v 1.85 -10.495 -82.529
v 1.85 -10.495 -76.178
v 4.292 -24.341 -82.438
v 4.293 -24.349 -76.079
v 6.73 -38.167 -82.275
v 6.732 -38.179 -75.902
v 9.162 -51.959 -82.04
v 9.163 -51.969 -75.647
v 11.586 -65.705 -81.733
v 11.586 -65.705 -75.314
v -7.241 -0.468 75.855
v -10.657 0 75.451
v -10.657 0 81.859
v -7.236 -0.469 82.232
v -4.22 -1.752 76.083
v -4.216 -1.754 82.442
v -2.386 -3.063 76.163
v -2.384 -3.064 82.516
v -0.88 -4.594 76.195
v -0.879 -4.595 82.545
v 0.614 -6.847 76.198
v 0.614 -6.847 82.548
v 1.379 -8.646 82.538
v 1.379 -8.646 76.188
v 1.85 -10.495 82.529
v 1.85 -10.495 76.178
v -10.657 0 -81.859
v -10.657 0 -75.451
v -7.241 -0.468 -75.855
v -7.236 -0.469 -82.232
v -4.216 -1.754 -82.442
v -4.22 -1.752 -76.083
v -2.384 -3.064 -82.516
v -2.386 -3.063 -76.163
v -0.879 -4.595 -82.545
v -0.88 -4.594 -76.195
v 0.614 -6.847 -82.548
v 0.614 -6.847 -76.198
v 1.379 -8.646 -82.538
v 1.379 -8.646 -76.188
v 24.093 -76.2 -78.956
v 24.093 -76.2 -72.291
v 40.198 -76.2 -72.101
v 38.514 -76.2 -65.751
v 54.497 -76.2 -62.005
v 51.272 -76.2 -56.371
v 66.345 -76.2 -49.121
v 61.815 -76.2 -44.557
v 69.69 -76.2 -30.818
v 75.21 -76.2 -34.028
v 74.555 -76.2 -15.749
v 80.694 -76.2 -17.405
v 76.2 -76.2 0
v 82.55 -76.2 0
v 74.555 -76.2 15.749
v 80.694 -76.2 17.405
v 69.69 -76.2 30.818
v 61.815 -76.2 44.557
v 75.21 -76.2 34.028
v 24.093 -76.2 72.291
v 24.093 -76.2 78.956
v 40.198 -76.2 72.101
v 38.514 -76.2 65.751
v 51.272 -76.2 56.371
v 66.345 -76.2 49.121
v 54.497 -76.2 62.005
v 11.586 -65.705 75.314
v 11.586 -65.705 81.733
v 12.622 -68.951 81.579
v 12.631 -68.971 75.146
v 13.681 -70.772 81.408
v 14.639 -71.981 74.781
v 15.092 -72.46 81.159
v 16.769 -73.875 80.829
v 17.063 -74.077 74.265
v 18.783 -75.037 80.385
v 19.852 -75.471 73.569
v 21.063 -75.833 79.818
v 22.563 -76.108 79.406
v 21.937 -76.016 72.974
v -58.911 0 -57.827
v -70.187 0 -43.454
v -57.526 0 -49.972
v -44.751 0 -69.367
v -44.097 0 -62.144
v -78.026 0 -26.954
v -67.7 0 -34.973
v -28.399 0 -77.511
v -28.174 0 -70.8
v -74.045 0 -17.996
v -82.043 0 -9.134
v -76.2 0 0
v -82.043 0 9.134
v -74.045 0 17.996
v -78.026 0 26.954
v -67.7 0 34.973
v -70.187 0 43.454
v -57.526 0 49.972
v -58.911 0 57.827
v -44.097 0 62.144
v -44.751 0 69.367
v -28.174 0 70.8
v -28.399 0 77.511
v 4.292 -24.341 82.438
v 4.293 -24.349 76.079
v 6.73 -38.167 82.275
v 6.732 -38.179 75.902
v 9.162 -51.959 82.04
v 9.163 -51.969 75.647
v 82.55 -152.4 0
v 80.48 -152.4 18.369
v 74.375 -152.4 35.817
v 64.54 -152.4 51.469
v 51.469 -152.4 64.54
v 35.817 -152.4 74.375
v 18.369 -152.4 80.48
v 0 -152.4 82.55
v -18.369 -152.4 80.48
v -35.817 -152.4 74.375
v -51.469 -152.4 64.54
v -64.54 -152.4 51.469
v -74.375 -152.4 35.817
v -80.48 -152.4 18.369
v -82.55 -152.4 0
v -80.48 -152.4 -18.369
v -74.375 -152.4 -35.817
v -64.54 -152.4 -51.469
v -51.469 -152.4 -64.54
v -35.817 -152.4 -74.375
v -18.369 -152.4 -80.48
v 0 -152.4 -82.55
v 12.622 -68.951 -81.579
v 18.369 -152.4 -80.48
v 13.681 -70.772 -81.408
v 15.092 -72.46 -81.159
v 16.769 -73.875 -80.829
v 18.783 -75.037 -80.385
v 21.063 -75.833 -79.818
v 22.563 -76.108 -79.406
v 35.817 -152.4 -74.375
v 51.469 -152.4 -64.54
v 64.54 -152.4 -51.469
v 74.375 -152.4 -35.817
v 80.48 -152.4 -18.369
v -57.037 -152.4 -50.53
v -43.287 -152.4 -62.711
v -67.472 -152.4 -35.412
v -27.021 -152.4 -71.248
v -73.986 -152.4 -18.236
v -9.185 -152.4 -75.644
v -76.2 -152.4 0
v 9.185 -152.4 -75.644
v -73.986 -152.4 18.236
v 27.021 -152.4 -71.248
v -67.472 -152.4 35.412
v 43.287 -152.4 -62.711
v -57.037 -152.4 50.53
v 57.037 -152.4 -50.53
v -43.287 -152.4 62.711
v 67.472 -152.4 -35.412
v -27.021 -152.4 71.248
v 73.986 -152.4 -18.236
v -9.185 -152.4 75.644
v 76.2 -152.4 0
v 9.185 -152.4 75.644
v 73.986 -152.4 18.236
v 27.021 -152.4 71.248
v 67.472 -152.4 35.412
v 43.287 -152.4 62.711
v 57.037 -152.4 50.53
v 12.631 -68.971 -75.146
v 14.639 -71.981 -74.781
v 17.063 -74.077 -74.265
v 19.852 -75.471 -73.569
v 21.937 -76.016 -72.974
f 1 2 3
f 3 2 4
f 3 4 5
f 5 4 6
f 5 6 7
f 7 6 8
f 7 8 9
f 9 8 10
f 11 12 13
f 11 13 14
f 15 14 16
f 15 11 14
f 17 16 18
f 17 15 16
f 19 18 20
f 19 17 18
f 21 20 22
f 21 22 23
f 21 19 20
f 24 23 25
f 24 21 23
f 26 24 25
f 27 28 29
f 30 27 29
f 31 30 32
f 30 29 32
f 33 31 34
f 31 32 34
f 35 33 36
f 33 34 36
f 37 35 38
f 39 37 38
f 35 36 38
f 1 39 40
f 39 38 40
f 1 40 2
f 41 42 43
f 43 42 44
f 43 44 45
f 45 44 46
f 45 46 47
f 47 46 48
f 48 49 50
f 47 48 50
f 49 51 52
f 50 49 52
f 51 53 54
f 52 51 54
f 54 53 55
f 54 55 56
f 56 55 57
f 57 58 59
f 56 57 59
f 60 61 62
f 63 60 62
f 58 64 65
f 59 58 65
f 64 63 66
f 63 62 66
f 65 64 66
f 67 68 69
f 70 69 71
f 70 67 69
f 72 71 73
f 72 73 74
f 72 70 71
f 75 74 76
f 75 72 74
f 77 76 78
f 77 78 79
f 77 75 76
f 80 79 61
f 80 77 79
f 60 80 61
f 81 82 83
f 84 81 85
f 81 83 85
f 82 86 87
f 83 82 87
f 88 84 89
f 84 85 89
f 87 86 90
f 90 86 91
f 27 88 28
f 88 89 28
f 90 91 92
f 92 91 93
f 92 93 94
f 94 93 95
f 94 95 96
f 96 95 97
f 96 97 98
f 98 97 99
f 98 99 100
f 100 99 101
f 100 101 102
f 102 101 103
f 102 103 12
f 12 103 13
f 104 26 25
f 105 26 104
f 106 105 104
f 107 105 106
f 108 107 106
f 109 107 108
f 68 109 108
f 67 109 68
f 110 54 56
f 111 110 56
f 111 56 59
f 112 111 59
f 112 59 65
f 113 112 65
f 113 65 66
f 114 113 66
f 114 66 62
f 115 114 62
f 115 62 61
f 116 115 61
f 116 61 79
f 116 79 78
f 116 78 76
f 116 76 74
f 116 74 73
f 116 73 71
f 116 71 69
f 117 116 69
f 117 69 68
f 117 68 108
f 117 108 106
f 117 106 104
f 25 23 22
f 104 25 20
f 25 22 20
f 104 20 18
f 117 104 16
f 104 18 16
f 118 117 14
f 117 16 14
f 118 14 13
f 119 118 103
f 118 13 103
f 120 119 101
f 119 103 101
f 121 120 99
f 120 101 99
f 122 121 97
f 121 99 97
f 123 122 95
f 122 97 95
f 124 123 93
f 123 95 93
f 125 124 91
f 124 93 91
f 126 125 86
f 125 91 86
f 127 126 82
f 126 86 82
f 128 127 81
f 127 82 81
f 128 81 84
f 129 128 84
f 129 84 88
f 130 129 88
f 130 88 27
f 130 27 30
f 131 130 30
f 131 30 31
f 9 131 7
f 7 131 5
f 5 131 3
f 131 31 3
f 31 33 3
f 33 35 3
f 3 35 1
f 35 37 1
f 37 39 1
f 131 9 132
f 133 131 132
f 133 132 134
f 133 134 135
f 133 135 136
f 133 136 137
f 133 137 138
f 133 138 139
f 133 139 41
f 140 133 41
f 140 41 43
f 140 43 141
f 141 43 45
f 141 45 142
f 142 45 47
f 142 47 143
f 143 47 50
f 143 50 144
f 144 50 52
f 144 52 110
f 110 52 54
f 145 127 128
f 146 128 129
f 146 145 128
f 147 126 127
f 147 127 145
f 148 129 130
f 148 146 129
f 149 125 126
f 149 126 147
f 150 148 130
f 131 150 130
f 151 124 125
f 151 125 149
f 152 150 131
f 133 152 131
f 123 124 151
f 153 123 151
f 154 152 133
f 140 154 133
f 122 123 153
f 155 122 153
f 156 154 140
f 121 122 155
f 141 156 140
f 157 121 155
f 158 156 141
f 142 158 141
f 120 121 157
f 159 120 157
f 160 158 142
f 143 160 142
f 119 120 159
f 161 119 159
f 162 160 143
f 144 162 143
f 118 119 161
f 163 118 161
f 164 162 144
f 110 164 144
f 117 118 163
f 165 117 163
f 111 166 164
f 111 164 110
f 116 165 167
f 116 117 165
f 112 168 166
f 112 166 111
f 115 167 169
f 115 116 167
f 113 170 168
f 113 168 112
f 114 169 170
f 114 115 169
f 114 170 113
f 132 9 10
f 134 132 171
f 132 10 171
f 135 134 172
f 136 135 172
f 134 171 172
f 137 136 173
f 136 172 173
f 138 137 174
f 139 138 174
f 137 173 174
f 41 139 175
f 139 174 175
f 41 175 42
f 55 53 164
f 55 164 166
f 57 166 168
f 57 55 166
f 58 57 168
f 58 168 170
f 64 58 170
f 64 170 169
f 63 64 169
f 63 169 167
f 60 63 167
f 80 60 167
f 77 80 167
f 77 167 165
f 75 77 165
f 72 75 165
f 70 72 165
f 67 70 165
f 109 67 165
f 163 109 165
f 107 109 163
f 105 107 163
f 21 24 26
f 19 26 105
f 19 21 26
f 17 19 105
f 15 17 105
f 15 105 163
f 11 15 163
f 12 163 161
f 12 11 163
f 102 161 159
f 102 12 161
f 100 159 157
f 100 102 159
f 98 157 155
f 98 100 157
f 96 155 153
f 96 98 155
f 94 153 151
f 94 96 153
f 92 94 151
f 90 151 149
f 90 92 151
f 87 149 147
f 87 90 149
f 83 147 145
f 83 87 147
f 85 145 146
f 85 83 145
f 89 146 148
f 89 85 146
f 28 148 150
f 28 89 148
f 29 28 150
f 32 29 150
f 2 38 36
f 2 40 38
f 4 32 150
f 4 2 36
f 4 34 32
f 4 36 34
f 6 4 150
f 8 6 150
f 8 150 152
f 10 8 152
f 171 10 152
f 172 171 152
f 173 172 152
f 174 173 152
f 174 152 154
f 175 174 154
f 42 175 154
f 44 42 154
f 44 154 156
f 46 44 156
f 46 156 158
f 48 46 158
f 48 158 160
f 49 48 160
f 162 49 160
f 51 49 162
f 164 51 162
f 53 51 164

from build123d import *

# Parameters (mm, degrees)
F0_R          = 82.55
F0_R_2        = 76.2
F1_DEPTH      = 152.4
F3_DEPTH      = 82.551
F3_DEPTH_BACK = 82.551


with BuildPart() as f1:
    # F0 (on Front) → F1 (new body)
    with BuildSketch(Plane.XZ):
        Circle(F0_R)
        Circle(F0_R_2, mode=Mode.SUBTRACT)
    extrude(amount=F1_DEPTH)

    # F2 (on Top) → F3 (cut, two sides)
    with BuildSketch(Plane.XY) as f3_sk:
        with BuildLine():
            ThreePointArc((-10.656565316, 0), (-2.4931626729, -2.9712355724), (1.8504931473, -10.4946681436))
            Line((1.8504931473, -10.4946681436), (11.5856227827, -65.7053318564))
            ThreePointArc((11.5856227827, -65.7053318564), (15.9292786029, -73.2287644276), (24.0926812459, -76.2))
            Line((24.0926812459, -76.2), (82.55, -76.2))
            Line((82.55, -76.2), (82.55, 0))
            Line((82.55, 0), (-10.656565316, 0))
        make_face()
    extrude(amount=-F3_DEPTH, mode=Mode.SUBTRACT)
    extrude(f3_sk.sketch, amount=F3_DEPTH_BACK, mode=Mode.SUBTRACT)


solid = f1.part
